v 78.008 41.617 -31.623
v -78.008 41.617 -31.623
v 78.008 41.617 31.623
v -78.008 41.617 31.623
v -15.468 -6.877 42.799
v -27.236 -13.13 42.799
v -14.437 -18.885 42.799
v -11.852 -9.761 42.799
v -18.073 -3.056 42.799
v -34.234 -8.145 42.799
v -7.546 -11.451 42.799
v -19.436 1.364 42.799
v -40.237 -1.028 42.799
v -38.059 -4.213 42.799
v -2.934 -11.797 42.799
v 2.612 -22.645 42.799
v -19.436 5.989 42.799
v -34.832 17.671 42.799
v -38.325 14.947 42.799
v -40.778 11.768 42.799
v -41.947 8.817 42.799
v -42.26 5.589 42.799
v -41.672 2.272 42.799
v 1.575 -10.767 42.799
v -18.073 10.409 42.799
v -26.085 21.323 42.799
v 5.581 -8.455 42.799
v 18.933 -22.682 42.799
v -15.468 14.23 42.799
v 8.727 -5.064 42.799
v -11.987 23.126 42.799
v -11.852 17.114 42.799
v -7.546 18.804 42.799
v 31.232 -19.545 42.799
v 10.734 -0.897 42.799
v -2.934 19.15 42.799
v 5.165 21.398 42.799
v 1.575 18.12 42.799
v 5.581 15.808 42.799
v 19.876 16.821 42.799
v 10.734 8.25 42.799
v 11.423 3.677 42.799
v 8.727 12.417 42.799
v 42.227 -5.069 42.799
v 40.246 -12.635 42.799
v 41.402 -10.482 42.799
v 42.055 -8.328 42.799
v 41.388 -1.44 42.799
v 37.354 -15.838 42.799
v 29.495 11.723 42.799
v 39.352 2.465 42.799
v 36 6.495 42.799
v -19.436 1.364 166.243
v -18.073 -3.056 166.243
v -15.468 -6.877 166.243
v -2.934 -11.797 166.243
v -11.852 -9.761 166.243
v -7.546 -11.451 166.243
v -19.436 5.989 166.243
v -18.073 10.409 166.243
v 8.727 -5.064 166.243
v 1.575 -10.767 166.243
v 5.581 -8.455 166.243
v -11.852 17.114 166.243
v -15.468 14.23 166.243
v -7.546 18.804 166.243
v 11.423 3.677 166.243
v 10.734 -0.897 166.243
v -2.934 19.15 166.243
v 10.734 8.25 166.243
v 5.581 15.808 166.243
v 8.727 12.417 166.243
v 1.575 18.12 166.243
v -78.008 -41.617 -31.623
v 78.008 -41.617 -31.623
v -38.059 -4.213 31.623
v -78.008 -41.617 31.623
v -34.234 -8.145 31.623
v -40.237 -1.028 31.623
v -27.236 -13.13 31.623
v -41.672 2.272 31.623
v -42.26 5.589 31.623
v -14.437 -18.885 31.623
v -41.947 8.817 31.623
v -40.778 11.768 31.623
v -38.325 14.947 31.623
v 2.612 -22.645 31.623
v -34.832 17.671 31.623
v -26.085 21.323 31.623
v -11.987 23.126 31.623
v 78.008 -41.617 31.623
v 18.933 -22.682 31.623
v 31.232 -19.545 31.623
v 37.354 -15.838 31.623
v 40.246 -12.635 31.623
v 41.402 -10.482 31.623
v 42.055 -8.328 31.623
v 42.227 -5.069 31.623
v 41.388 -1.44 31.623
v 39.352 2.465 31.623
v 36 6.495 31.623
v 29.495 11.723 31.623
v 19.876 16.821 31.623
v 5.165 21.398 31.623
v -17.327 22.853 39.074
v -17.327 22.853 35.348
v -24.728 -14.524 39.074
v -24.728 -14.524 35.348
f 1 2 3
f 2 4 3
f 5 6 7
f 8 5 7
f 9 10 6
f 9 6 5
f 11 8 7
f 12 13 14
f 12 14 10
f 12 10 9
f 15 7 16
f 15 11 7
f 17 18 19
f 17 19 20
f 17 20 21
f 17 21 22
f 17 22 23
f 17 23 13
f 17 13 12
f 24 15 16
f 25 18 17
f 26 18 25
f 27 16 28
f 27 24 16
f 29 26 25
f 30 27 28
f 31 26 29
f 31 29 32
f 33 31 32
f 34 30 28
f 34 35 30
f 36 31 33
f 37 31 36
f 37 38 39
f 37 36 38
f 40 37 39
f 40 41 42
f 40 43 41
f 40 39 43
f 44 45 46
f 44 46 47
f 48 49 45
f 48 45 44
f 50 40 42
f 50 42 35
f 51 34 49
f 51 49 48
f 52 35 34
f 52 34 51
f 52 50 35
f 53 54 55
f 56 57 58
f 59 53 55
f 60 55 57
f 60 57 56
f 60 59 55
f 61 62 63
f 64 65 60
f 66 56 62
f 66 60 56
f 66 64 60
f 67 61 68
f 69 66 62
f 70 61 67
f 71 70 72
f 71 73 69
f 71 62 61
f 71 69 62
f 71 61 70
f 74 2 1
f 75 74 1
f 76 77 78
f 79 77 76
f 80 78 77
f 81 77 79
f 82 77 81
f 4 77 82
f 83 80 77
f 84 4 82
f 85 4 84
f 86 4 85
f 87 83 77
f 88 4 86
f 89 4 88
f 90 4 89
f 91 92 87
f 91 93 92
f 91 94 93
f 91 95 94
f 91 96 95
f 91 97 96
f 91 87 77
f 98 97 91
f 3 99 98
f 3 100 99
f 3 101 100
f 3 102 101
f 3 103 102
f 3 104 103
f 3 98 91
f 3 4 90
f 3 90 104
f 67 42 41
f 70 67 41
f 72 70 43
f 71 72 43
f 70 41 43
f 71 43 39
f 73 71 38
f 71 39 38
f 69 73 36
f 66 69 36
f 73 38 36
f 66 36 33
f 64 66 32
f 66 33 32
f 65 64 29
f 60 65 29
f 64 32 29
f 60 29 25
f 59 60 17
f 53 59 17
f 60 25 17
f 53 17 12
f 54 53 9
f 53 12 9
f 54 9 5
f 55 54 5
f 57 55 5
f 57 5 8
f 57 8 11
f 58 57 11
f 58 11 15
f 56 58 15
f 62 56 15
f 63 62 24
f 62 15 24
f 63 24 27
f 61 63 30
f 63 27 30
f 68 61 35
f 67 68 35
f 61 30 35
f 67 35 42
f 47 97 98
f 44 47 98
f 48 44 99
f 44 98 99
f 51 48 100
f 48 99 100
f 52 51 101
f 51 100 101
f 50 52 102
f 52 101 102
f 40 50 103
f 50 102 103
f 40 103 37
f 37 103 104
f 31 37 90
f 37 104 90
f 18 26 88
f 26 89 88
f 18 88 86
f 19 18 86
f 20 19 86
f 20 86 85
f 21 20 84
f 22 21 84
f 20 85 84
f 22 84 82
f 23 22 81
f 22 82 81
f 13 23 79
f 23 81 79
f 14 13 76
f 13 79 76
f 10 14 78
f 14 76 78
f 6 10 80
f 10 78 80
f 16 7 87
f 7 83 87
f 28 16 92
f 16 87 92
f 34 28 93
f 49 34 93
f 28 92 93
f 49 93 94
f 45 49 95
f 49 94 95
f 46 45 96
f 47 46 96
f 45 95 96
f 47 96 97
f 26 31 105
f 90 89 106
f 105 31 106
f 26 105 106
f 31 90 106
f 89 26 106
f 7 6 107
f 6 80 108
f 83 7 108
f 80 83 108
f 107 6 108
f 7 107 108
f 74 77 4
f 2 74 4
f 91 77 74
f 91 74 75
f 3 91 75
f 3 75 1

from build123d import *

# Parameters (mm, degrees)
F0_W     = 156.015798
F0_H     = 83.234488
F1_DEPTH = 31.623
F3_DEPTH = 11.176
F4_R     = 15.516402
F5_DEPTH = 123.444


with BuildPart() as f1:
    # F0 (on Top) → F1 (new body, symmetric)
    with BuildSketch(Plane.XY):
        Rectangle(F0_W, F0_H)
    extrude(amount=F1_DEPTH, both=True)

    # F2 (on face) → F3 (join)
    with BuildSketch(Plane.XY.offset(31.623)):
        with BuildLine():
            add(Edge.make_bspline(
                [(42.055041, -8.328438), (49.456989, 29.048226), (-17.326546, 22.852551), (-84.110081, 16.656876), (-24.728494, -14.524113), (34.653093, -45.705102), (42.055041, -8.328438)],
                knots=[0, 0, 0, 2.094395, 2.094395, 4.18879, 4.18879, 6.283185, 6.283185, 6.283185], degree=2, weights=[1, 0.5, 1, 0.5, 1, 0.5, 1]))
        make_face()
    extrude(amount=F3_DEPTH)

    # F4 (on face) → F5 (join)
    with BuildSketch(Plane.XY.offset(42.799)):
        with Locations((-4.093342, 3.676504)):
            Circle(F4_R)
    extrude(amount=F5_DEPTH)


solid = f1.part
